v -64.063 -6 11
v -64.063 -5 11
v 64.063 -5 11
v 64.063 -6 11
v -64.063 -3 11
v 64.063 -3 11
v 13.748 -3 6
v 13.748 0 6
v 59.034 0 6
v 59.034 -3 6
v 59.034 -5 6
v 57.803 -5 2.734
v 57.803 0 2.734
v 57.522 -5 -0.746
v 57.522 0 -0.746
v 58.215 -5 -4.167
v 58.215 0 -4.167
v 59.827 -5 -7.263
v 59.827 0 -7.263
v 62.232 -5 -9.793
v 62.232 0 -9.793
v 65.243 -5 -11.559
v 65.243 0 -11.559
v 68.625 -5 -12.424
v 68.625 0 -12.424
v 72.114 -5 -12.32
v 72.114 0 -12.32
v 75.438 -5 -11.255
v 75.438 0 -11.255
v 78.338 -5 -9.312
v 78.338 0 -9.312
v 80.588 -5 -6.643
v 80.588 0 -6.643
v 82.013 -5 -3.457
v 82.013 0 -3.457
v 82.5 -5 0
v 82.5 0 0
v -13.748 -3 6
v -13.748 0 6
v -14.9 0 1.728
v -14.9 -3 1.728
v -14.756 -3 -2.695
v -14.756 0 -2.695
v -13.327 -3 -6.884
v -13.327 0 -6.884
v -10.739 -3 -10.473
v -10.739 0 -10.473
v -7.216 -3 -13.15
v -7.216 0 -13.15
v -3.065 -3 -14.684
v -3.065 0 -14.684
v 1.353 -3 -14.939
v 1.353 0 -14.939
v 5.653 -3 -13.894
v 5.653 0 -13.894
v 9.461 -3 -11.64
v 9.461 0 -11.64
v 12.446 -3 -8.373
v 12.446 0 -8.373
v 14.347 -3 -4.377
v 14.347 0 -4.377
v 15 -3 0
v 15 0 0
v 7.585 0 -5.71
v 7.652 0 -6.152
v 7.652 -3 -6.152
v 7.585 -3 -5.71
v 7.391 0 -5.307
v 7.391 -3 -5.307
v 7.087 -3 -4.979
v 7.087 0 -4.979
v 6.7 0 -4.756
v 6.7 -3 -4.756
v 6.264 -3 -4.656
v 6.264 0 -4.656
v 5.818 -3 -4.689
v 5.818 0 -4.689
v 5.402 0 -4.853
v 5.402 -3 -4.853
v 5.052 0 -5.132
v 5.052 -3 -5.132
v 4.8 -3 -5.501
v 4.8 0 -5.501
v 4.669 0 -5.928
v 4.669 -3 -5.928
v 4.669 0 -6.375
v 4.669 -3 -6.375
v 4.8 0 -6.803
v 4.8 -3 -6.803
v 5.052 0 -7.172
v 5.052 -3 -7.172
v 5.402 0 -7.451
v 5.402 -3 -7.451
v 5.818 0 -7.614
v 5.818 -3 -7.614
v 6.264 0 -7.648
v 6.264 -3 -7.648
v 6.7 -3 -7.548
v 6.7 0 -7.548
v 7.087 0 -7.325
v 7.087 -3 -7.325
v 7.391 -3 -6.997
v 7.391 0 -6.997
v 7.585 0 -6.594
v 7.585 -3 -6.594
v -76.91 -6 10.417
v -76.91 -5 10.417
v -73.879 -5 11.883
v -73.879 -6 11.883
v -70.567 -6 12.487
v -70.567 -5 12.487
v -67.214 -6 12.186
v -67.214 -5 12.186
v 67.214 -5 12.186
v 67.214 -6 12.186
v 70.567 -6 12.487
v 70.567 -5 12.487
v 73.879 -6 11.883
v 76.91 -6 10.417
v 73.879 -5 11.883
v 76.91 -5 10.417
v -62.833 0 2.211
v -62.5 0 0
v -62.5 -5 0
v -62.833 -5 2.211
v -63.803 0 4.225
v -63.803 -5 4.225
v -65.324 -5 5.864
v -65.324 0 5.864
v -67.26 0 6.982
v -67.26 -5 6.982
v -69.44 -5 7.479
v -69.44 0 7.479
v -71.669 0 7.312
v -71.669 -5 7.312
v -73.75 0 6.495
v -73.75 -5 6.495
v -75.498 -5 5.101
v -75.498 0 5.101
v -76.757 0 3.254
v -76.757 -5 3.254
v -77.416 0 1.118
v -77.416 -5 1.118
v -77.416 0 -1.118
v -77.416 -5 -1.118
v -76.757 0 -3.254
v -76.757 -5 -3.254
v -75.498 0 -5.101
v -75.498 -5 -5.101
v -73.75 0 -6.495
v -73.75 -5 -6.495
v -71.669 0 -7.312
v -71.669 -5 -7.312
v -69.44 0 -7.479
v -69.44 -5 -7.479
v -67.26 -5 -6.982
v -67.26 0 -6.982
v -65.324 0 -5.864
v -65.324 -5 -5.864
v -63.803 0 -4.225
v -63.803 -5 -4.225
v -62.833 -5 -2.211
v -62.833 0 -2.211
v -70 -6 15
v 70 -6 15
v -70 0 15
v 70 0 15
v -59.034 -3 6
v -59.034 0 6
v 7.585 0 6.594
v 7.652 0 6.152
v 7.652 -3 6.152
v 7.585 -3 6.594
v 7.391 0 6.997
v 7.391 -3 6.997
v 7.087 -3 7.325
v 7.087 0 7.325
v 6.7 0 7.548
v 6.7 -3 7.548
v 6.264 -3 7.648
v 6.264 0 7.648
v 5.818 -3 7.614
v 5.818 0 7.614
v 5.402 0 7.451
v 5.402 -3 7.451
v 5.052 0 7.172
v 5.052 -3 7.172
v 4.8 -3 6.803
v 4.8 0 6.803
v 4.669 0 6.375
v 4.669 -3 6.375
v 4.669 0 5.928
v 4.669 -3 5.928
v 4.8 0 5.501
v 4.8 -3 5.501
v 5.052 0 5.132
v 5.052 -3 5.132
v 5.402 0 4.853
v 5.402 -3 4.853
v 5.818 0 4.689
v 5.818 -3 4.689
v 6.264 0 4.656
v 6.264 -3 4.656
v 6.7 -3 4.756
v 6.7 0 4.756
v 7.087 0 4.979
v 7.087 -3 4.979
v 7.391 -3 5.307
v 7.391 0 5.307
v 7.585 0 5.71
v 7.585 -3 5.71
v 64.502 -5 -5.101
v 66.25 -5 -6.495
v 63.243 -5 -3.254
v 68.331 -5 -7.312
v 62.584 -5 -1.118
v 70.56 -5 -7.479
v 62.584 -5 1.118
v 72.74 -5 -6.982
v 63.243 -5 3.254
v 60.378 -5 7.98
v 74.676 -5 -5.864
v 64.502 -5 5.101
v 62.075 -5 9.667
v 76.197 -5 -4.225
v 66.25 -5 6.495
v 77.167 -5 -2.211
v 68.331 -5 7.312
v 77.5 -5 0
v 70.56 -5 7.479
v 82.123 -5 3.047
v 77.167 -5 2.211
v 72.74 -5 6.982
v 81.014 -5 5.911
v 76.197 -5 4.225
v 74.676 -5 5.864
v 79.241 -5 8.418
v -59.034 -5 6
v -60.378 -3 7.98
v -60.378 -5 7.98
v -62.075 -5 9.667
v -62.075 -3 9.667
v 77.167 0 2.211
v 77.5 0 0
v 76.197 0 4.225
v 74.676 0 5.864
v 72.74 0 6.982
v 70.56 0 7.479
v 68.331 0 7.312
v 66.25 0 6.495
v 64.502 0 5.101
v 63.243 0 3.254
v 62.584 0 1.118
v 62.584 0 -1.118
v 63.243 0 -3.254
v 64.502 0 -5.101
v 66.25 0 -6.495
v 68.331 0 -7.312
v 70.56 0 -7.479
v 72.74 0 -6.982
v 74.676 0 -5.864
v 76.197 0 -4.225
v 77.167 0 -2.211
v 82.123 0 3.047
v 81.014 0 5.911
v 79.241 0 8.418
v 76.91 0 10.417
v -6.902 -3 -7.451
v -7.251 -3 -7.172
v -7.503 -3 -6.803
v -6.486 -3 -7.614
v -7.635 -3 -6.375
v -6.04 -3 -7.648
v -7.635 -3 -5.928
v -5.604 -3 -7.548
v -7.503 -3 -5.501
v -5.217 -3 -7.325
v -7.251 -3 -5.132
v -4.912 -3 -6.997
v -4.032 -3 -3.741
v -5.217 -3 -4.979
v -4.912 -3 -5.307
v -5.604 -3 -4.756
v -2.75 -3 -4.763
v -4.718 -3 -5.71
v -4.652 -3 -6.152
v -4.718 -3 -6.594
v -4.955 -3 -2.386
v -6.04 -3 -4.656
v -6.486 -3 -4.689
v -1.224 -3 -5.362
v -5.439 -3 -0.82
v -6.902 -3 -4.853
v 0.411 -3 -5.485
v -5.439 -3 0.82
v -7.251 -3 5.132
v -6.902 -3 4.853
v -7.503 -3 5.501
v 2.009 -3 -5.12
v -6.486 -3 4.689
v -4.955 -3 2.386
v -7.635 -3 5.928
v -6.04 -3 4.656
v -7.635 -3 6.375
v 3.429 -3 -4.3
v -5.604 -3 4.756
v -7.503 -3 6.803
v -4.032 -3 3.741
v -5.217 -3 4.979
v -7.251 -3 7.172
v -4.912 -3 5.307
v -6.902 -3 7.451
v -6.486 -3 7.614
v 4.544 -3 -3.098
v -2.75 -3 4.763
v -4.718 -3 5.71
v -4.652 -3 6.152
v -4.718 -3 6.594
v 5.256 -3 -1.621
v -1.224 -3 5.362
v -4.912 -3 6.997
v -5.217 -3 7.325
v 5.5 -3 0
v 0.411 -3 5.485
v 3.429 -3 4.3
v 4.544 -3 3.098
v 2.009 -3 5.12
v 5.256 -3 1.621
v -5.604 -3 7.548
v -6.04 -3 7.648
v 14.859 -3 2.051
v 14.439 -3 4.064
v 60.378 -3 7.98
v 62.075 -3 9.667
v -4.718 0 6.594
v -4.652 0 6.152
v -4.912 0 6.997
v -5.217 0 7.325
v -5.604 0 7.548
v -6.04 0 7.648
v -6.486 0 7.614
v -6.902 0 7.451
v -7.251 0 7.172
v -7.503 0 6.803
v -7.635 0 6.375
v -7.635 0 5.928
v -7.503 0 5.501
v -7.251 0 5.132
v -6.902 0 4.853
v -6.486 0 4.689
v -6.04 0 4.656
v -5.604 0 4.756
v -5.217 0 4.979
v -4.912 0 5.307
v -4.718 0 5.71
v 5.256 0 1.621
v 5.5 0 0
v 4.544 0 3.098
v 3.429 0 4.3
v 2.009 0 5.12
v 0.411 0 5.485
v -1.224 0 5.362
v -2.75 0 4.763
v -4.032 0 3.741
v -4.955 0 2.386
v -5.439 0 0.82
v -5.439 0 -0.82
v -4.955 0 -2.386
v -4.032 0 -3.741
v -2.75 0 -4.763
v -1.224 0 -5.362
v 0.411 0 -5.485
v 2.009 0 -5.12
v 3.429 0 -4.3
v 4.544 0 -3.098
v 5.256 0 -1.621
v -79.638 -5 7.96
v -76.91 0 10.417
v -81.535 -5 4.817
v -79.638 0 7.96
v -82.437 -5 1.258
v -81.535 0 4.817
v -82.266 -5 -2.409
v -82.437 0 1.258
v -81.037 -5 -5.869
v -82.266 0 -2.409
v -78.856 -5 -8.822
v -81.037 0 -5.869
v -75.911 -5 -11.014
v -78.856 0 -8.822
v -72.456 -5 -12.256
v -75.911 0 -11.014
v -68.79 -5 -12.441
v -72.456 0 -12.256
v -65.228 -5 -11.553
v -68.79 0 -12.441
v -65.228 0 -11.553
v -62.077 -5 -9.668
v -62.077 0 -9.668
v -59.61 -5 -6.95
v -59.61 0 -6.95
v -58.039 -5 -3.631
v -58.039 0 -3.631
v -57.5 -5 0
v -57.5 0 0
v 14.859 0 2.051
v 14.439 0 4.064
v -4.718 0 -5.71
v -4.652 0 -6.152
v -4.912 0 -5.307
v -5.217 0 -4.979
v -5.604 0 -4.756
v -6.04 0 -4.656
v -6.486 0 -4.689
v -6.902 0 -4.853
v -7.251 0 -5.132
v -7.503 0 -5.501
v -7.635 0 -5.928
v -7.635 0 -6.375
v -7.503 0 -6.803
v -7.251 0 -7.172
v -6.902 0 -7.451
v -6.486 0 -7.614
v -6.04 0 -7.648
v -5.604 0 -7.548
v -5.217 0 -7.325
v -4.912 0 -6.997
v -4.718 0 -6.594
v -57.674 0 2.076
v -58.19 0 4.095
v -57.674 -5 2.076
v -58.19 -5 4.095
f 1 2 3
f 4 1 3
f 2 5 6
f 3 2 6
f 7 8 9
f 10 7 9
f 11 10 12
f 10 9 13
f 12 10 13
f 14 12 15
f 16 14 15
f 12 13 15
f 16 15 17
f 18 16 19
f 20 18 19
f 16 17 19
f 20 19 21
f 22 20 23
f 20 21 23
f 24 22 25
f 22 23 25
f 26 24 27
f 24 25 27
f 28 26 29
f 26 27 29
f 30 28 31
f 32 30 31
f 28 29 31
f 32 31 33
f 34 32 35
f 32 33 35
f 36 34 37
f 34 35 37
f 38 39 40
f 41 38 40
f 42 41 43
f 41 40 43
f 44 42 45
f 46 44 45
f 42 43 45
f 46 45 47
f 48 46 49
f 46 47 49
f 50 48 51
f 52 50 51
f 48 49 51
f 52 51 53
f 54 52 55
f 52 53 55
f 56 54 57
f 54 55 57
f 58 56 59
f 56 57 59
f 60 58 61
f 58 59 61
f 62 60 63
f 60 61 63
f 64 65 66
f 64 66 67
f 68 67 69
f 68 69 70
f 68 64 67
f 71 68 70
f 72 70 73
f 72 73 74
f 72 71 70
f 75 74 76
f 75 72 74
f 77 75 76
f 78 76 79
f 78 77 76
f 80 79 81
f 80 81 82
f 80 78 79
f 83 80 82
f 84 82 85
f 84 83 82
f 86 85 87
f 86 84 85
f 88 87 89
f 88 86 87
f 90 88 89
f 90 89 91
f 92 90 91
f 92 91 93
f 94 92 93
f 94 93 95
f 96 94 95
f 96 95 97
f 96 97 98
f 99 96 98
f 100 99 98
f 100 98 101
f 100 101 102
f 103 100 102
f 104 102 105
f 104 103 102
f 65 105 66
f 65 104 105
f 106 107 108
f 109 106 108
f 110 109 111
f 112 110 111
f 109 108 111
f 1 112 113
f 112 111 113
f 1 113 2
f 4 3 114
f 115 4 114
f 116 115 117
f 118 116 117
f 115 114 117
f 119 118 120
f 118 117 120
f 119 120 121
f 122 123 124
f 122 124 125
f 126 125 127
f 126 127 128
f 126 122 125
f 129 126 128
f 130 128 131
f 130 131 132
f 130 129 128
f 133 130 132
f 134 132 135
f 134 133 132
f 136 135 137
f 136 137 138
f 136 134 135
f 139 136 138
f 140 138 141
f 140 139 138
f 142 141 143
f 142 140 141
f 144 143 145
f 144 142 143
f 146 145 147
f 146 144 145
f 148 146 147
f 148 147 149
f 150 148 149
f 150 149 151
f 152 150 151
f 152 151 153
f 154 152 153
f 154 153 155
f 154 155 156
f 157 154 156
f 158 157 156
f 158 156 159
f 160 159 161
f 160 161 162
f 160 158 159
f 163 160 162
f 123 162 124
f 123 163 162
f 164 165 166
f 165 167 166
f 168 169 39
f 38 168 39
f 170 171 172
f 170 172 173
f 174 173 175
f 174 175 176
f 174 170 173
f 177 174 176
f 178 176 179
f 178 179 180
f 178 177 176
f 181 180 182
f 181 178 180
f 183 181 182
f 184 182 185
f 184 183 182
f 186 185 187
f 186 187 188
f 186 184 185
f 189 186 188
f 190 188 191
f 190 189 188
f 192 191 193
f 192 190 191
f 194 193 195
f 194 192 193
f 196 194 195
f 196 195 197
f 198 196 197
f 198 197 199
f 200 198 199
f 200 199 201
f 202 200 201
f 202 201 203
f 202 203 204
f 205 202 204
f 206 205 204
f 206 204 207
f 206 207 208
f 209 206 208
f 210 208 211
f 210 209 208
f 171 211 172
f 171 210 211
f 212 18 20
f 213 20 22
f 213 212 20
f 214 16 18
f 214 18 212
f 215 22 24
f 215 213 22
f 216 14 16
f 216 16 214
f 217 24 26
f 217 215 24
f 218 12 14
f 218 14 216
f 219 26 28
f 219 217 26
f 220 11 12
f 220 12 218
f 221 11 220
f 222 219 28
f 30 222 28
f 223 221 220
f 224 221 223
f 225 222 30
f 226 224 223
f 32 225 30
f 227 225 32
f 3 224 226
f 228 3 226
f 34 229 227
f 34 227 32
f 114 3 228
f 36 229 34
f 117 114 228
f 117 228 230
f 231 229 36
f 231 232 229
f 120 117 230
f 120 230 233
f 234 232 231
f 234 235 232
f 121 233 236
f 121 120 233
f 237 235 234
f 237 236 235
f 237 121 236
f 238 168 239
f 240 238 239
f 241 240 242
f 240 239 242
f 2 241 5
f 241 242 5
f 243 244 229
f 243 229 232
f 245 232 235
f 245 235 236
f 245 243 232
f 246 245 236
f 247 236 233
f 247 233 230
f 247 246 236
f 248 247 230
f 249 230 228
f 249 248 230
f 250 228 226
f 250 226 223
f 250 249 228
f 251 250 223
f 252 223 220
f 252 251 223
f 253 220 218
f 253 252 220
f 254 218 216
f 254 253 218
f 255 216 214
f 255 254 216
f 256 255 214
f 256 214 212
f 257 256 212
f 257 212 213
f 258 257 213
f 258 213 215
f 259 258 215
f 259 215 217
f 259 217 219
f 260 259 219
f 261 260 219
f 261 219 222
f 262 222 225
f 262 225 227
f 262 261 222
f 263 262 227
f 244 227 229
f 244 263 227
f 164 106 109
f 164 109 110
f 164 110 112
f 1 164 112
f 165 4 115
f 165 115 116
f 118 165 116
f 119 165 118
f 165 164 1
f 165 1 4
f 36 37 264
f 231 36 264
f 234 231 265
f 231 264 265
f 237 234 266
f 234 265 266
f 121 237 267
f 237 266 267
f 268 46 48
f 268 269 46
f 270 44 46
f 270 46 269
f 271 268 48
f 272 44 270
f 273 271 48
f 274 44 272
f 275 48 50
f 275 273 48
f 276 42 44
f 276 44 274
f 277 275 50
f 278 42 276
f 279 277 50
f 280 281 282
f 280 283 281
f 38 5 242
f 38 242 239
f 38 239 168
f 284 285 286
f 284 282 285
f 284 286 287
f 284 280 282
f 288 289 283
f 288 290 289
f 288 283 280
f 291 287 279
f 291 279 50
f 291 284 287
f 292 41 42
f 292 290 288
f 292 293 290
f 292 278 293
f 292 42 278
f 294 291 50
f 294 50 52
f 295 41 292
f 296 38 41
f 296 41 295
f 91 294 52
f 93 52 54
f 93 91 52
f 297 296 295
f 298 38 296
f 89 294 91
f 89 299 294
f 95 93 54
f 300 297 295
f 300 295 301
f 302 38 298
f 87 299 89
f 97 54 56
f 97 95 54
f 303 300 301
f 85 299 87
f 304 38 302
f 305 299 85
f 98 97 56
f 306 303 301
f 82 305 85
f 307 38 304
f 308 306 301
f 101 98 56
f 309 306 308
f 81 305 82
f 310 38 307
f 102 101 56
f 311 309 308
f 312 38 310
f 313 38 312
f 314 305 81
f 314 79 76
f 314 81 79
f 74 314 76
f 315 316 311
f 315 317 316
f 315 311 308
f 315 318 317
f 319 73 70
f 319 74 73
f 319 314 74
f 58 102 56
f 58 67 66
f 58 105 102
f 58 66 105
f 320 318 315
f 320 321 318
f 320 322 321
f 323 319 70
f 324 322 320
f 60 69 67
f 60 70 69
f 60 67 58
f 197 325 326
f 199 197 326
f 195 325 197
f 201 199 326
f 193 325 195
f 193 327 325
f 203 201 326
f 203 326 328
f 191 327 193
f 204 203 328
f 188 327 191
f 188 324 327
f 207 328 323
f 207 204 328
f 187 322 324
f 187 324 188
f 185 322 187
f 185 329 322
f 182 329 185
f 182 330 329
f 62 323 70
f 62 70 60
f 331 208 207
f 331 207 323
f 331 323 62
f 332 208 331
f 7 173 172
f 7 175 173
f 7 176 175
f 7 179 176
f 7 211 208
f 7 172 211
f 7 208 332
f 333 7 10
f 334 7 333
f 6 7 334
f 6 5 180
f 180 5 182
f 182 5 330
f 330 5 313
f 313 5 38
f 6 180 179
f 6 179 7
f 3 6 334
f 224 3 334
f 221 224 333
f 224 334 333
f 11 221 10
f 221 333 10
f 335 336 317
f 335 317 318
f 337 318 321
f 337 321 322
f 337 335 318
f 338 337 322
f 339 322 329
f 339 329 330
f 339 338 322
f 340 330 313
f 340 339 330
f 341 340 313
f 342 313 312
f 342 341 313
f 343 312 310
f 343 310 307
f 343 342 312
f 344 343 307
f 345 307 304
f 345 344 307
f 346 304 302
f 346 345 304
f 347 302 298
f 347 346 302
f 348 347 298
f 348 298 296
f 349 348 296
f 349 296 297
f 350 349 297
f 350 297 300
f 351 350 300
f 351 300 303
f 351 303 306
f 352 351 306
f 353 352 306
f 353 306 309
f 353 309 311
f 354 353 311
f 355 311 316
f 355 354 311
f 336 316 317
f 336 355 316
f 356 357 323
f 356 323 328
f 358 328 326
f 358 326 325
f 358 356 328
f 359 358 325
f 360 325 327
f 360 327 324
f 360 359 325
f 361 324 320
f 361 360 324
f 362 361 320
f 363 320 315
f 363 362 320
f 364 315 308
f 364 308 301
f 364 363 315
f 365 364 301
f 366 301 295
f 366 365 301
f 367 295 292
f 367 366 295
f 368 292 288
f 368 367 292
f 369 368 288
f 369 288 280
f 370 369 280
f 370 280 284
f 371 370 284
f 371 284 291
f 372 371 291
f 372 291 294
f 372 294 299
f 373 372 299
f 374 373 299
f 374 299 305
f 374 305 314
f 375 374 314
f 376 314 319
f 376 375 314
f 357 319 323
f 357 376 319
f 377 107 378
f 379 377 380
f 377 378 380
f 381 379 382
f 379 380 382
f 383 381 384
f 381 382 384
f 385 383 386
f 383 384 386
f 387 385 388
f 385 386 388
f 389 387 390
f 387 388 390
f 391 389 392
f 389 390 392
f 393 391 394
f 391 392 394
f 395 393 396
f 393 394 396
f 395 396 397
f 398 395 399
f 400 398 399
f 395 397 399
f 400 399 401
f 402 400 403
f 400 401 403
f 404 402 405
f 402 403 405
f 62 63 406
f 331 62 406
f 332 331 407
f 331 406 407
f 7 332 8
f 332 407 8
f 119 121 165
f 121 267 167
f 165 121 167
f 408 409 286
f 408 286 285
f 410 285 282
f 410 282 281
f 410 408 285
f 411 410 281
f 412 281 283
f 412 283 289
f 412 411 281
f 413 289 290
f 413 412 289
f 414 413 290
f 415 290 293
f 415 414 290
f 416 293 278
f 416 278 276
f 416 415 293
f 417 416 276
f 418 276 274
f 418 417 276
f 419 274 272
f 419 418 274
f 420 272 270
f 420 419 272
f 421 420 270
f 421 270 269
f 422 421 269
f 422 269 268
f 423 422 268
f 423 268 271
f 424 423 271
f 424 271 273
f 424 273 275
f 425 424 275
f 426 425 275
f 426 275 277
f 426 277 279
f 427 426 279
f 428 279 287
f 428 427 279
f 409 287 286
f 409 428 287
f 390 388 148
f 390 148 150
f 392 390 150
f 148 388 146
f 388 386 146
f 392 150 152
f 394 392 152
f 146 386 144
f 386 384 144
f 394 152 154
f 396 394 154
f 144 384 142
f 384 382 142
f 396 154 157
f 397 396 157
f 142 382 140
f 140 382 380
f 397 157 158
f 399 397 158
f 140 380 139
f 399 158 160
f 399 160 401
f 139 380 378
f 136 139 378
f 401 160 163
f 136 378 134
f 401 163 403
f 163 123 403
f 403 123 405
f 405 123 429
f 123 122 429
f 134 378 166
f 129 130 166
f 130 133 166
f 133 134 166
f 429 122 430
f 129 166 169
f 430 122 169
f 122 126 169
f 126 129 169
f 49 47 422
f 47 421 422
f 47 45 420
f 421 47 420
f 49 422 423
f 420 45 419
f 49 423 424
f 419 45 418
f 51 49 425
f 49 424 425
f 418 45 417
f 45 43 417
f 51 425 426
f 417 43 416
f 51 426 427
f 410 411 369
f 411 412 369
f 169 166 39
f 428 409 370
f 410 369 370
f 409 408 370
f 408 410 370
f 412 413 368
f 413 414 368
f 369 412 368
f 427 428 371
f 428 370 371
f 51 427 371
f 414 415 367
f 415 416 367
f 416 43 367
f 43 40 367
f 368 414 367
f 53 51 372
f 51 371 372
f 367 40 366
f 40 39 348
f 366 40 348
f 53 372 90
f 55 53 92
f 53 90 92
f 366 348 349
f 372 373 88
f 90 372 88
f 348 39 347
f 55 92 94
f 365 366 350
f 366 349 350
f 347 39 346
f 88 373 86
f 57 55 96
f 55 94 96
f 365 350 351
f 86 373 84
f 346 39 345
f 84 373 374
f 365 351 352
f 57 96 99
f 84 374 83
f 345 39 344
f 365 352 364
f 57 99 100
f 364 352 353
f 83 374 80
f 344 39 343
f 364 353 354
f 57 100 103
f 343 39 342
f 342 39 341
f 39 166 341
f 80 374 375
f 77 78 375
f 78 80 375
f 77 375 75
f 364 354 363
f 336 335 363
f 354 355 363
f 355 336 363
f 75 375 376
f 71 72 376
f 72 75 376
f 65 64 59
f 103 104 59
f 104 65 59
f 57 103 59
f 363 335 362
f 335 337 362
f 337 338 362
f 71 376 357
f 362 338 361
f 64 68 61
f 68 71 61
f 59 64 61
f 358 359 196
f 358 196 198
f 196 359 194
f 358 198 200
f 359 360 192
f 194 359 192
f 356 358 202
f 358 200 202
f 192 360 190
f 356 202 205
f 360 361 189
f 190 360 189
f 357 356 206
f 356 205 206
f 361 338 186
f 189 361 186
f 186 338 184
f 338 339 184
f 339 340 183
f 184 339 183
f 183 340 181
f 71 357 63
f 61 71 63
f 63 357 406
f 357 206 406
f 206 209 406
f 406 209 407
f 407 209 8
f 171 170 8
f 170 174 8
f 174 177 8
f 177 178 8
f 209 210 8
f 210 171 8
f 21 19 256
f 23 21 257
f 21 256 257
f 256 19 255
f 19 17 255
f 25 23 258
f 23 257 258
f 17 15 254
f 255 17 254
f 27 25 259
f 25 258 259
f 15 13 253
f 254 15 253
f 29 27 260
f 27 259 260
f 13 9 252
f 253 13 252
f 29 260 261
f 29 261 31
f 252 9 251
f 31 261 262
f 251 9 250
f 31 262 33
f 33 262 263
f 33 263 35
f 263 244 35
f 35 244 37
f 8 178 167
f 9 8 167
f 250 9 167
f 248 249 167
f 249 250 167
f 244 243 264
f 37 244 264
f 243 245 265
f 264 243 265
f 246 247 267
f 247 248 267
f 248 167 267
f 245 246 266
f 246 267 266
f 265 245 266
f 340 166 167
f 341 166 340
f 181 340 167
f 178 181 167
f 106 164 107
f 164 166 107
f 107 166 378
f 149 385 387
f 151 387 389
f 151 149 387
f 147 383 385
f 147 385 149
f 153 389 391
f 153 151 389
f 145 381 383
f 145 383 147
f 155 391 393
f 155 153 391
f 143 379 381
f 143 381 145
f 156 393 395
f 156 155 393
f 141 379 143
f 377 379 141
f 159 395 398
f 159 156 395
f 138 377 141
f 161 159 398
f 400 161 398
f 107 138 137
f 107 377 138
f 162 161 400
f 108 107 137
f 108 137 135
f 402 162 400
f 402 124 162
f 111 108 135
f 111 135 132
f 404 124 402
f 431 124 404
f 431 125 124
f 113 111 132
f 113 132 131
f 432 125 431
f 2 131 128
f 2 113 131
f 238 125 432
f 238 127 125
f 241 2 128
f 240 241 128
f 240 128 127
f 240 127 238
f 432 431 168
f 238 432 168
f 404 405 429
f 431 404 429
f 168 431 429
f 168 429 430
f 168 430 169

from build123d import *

# Parameters (mm, degrees)
F0_R     = 1.5
F0_R_2   = 5.5
F1_DEPTH = 3
F0_R_3   = 7.5
F2_DEPTH = 5
F4_DEPTH = 3


with BuildPart() as f1:
    # F0 (on Front) → F1 (new body)
    with BuildSketch(Plane.XZ):
        with BuildLine():
            ThreePointArc((15, 0), (14.683594694, 3.0646446553), (13.7477270849, 6))
            ThreePointArc((13.7477270849, 6), (8.2158383626, 12.549900398), (0, 15))
            ThreePointArc((0, 15), (-8.2158383626, 12.549900398), (-13.7477270849, 6))
            ThreePointArc((-13.7477270849, 6), (-3.0646446553, -14.683594694), (15, 0))
        make_face()
        with Locations((-6.1518289963, -6.1518289963)):
            Circle(F0_R, mode=Mode.SUBTRACT)
        with Locations((6.1518289963, -6.1518289963)):
            Circle(F0_R, mode=Mode.SUBTRACT)
        with Locations((-6.1518289963, 6.1518289963)):
            Circle(F0_R, mode=Mode.SUBTRACT)
        Circle(F0_R_2, mode=Mode.SUBTRACT)
        with Locations((6.1518289963, 6.1518289963)):
            Circle(F0_R, mode=Mode.SUBTRACT)
        with BuildLine():
            ThreePointArc((59.0341439003, 6), (67.0016723737, 12.135074431), (76.9096349799, 10.4166666667))
            Line((76.9096349799, 10.4166666667), (70, 15))
            Line((70, 15), (0, 15))
            ThreePointArc((0, 15), (8.2158383626, 12.549900398), (13.7477270849, 6))
            Line((13.7477270849, 6), (59.0341439003, 6))
        make_face()
        with BuildLine():
            ThreePointArc((-13.7477270849, 6), (-8.2158383626, 12.549900398), (0, 15))
            Line((0, 15), (-70, 15))
            Line((-70, 15), (-76.9096349799, 10.4166666667))
            ThreePointArc((-76.9096349799, 10.4166666667), (-67.0016723737, 12.135074431), (-59.0341439003, 6))
            Line((-59.0341439003, 6), (-13.7477270849, 6))
        make_face()
    extrude(amount=F1_DEPTH)

    # F0 (on Front) → F2 (join)
    with BuildSketch(Plane.XZ):
        with BuildLine():
            ThreePointArc((59.0341439003, 6), (66.9034859315, -12.1103922572), (82.5, 0))
            ThreePointArc((82.5, 0), (81.0140918202, 5.9109881894), (76.9096349799, 10.4166666667))
            ThreePointArc((76.9096349799, 10.4166666667), (67.0016723737, 12.135074431), (59.0341439003, 6))
        make_face()
        with Locations((70, 0)):
            Circle(F0_R_3, mode=Mode.SUBTRACT)
        with BuildLine():
            ThreePointArc((-57.5, 0), (-57.8896077428, 3.0965140685), (-59.0341439003, 6))
            ThreePointArc((-59.0341439003, 6), (-67.0016723737, 12.135074431), (-76.9096349799, 10.4166666667))
            ThreePointArc((-76.9096349799, 10.4166666667), (-75.9109881894, -11.0140918202), (-57.5, 0))
        make_face()
        with Locations((-70, 0)):
            Circle(F0_R_3, mode=Mode.SUBTRACT)
    extrude(amount=F2_DEPTH)

    # F3 (on face) → F4 (join)
    with BuildSketch(Plane.XZ.offset(3)):
        with BuildLine():
            Line((0, 11), (64.0628289565, 11))
            ThreePointArc((64.0628289565, 11), (70.5670017384, 12.4871337395), (76.9096349799, 10.4166666667))
            Line((76.9096349799, 10.4166666667), (70, 15))
            Line((70, 15), (-70, 15))
            Line((-70, 15), (-76.9096349799, 10.4166666667))
            ThreePointArc((-76.9096349799, 10.4166666667), (-70.5670017384, 12.4871337395), (-64.0628289565, 11))
            Line((-64.0628289565, 11), (0, 11))
        make_face()
    extrude(amount=F4_DEPTH)


solid = f1.part
